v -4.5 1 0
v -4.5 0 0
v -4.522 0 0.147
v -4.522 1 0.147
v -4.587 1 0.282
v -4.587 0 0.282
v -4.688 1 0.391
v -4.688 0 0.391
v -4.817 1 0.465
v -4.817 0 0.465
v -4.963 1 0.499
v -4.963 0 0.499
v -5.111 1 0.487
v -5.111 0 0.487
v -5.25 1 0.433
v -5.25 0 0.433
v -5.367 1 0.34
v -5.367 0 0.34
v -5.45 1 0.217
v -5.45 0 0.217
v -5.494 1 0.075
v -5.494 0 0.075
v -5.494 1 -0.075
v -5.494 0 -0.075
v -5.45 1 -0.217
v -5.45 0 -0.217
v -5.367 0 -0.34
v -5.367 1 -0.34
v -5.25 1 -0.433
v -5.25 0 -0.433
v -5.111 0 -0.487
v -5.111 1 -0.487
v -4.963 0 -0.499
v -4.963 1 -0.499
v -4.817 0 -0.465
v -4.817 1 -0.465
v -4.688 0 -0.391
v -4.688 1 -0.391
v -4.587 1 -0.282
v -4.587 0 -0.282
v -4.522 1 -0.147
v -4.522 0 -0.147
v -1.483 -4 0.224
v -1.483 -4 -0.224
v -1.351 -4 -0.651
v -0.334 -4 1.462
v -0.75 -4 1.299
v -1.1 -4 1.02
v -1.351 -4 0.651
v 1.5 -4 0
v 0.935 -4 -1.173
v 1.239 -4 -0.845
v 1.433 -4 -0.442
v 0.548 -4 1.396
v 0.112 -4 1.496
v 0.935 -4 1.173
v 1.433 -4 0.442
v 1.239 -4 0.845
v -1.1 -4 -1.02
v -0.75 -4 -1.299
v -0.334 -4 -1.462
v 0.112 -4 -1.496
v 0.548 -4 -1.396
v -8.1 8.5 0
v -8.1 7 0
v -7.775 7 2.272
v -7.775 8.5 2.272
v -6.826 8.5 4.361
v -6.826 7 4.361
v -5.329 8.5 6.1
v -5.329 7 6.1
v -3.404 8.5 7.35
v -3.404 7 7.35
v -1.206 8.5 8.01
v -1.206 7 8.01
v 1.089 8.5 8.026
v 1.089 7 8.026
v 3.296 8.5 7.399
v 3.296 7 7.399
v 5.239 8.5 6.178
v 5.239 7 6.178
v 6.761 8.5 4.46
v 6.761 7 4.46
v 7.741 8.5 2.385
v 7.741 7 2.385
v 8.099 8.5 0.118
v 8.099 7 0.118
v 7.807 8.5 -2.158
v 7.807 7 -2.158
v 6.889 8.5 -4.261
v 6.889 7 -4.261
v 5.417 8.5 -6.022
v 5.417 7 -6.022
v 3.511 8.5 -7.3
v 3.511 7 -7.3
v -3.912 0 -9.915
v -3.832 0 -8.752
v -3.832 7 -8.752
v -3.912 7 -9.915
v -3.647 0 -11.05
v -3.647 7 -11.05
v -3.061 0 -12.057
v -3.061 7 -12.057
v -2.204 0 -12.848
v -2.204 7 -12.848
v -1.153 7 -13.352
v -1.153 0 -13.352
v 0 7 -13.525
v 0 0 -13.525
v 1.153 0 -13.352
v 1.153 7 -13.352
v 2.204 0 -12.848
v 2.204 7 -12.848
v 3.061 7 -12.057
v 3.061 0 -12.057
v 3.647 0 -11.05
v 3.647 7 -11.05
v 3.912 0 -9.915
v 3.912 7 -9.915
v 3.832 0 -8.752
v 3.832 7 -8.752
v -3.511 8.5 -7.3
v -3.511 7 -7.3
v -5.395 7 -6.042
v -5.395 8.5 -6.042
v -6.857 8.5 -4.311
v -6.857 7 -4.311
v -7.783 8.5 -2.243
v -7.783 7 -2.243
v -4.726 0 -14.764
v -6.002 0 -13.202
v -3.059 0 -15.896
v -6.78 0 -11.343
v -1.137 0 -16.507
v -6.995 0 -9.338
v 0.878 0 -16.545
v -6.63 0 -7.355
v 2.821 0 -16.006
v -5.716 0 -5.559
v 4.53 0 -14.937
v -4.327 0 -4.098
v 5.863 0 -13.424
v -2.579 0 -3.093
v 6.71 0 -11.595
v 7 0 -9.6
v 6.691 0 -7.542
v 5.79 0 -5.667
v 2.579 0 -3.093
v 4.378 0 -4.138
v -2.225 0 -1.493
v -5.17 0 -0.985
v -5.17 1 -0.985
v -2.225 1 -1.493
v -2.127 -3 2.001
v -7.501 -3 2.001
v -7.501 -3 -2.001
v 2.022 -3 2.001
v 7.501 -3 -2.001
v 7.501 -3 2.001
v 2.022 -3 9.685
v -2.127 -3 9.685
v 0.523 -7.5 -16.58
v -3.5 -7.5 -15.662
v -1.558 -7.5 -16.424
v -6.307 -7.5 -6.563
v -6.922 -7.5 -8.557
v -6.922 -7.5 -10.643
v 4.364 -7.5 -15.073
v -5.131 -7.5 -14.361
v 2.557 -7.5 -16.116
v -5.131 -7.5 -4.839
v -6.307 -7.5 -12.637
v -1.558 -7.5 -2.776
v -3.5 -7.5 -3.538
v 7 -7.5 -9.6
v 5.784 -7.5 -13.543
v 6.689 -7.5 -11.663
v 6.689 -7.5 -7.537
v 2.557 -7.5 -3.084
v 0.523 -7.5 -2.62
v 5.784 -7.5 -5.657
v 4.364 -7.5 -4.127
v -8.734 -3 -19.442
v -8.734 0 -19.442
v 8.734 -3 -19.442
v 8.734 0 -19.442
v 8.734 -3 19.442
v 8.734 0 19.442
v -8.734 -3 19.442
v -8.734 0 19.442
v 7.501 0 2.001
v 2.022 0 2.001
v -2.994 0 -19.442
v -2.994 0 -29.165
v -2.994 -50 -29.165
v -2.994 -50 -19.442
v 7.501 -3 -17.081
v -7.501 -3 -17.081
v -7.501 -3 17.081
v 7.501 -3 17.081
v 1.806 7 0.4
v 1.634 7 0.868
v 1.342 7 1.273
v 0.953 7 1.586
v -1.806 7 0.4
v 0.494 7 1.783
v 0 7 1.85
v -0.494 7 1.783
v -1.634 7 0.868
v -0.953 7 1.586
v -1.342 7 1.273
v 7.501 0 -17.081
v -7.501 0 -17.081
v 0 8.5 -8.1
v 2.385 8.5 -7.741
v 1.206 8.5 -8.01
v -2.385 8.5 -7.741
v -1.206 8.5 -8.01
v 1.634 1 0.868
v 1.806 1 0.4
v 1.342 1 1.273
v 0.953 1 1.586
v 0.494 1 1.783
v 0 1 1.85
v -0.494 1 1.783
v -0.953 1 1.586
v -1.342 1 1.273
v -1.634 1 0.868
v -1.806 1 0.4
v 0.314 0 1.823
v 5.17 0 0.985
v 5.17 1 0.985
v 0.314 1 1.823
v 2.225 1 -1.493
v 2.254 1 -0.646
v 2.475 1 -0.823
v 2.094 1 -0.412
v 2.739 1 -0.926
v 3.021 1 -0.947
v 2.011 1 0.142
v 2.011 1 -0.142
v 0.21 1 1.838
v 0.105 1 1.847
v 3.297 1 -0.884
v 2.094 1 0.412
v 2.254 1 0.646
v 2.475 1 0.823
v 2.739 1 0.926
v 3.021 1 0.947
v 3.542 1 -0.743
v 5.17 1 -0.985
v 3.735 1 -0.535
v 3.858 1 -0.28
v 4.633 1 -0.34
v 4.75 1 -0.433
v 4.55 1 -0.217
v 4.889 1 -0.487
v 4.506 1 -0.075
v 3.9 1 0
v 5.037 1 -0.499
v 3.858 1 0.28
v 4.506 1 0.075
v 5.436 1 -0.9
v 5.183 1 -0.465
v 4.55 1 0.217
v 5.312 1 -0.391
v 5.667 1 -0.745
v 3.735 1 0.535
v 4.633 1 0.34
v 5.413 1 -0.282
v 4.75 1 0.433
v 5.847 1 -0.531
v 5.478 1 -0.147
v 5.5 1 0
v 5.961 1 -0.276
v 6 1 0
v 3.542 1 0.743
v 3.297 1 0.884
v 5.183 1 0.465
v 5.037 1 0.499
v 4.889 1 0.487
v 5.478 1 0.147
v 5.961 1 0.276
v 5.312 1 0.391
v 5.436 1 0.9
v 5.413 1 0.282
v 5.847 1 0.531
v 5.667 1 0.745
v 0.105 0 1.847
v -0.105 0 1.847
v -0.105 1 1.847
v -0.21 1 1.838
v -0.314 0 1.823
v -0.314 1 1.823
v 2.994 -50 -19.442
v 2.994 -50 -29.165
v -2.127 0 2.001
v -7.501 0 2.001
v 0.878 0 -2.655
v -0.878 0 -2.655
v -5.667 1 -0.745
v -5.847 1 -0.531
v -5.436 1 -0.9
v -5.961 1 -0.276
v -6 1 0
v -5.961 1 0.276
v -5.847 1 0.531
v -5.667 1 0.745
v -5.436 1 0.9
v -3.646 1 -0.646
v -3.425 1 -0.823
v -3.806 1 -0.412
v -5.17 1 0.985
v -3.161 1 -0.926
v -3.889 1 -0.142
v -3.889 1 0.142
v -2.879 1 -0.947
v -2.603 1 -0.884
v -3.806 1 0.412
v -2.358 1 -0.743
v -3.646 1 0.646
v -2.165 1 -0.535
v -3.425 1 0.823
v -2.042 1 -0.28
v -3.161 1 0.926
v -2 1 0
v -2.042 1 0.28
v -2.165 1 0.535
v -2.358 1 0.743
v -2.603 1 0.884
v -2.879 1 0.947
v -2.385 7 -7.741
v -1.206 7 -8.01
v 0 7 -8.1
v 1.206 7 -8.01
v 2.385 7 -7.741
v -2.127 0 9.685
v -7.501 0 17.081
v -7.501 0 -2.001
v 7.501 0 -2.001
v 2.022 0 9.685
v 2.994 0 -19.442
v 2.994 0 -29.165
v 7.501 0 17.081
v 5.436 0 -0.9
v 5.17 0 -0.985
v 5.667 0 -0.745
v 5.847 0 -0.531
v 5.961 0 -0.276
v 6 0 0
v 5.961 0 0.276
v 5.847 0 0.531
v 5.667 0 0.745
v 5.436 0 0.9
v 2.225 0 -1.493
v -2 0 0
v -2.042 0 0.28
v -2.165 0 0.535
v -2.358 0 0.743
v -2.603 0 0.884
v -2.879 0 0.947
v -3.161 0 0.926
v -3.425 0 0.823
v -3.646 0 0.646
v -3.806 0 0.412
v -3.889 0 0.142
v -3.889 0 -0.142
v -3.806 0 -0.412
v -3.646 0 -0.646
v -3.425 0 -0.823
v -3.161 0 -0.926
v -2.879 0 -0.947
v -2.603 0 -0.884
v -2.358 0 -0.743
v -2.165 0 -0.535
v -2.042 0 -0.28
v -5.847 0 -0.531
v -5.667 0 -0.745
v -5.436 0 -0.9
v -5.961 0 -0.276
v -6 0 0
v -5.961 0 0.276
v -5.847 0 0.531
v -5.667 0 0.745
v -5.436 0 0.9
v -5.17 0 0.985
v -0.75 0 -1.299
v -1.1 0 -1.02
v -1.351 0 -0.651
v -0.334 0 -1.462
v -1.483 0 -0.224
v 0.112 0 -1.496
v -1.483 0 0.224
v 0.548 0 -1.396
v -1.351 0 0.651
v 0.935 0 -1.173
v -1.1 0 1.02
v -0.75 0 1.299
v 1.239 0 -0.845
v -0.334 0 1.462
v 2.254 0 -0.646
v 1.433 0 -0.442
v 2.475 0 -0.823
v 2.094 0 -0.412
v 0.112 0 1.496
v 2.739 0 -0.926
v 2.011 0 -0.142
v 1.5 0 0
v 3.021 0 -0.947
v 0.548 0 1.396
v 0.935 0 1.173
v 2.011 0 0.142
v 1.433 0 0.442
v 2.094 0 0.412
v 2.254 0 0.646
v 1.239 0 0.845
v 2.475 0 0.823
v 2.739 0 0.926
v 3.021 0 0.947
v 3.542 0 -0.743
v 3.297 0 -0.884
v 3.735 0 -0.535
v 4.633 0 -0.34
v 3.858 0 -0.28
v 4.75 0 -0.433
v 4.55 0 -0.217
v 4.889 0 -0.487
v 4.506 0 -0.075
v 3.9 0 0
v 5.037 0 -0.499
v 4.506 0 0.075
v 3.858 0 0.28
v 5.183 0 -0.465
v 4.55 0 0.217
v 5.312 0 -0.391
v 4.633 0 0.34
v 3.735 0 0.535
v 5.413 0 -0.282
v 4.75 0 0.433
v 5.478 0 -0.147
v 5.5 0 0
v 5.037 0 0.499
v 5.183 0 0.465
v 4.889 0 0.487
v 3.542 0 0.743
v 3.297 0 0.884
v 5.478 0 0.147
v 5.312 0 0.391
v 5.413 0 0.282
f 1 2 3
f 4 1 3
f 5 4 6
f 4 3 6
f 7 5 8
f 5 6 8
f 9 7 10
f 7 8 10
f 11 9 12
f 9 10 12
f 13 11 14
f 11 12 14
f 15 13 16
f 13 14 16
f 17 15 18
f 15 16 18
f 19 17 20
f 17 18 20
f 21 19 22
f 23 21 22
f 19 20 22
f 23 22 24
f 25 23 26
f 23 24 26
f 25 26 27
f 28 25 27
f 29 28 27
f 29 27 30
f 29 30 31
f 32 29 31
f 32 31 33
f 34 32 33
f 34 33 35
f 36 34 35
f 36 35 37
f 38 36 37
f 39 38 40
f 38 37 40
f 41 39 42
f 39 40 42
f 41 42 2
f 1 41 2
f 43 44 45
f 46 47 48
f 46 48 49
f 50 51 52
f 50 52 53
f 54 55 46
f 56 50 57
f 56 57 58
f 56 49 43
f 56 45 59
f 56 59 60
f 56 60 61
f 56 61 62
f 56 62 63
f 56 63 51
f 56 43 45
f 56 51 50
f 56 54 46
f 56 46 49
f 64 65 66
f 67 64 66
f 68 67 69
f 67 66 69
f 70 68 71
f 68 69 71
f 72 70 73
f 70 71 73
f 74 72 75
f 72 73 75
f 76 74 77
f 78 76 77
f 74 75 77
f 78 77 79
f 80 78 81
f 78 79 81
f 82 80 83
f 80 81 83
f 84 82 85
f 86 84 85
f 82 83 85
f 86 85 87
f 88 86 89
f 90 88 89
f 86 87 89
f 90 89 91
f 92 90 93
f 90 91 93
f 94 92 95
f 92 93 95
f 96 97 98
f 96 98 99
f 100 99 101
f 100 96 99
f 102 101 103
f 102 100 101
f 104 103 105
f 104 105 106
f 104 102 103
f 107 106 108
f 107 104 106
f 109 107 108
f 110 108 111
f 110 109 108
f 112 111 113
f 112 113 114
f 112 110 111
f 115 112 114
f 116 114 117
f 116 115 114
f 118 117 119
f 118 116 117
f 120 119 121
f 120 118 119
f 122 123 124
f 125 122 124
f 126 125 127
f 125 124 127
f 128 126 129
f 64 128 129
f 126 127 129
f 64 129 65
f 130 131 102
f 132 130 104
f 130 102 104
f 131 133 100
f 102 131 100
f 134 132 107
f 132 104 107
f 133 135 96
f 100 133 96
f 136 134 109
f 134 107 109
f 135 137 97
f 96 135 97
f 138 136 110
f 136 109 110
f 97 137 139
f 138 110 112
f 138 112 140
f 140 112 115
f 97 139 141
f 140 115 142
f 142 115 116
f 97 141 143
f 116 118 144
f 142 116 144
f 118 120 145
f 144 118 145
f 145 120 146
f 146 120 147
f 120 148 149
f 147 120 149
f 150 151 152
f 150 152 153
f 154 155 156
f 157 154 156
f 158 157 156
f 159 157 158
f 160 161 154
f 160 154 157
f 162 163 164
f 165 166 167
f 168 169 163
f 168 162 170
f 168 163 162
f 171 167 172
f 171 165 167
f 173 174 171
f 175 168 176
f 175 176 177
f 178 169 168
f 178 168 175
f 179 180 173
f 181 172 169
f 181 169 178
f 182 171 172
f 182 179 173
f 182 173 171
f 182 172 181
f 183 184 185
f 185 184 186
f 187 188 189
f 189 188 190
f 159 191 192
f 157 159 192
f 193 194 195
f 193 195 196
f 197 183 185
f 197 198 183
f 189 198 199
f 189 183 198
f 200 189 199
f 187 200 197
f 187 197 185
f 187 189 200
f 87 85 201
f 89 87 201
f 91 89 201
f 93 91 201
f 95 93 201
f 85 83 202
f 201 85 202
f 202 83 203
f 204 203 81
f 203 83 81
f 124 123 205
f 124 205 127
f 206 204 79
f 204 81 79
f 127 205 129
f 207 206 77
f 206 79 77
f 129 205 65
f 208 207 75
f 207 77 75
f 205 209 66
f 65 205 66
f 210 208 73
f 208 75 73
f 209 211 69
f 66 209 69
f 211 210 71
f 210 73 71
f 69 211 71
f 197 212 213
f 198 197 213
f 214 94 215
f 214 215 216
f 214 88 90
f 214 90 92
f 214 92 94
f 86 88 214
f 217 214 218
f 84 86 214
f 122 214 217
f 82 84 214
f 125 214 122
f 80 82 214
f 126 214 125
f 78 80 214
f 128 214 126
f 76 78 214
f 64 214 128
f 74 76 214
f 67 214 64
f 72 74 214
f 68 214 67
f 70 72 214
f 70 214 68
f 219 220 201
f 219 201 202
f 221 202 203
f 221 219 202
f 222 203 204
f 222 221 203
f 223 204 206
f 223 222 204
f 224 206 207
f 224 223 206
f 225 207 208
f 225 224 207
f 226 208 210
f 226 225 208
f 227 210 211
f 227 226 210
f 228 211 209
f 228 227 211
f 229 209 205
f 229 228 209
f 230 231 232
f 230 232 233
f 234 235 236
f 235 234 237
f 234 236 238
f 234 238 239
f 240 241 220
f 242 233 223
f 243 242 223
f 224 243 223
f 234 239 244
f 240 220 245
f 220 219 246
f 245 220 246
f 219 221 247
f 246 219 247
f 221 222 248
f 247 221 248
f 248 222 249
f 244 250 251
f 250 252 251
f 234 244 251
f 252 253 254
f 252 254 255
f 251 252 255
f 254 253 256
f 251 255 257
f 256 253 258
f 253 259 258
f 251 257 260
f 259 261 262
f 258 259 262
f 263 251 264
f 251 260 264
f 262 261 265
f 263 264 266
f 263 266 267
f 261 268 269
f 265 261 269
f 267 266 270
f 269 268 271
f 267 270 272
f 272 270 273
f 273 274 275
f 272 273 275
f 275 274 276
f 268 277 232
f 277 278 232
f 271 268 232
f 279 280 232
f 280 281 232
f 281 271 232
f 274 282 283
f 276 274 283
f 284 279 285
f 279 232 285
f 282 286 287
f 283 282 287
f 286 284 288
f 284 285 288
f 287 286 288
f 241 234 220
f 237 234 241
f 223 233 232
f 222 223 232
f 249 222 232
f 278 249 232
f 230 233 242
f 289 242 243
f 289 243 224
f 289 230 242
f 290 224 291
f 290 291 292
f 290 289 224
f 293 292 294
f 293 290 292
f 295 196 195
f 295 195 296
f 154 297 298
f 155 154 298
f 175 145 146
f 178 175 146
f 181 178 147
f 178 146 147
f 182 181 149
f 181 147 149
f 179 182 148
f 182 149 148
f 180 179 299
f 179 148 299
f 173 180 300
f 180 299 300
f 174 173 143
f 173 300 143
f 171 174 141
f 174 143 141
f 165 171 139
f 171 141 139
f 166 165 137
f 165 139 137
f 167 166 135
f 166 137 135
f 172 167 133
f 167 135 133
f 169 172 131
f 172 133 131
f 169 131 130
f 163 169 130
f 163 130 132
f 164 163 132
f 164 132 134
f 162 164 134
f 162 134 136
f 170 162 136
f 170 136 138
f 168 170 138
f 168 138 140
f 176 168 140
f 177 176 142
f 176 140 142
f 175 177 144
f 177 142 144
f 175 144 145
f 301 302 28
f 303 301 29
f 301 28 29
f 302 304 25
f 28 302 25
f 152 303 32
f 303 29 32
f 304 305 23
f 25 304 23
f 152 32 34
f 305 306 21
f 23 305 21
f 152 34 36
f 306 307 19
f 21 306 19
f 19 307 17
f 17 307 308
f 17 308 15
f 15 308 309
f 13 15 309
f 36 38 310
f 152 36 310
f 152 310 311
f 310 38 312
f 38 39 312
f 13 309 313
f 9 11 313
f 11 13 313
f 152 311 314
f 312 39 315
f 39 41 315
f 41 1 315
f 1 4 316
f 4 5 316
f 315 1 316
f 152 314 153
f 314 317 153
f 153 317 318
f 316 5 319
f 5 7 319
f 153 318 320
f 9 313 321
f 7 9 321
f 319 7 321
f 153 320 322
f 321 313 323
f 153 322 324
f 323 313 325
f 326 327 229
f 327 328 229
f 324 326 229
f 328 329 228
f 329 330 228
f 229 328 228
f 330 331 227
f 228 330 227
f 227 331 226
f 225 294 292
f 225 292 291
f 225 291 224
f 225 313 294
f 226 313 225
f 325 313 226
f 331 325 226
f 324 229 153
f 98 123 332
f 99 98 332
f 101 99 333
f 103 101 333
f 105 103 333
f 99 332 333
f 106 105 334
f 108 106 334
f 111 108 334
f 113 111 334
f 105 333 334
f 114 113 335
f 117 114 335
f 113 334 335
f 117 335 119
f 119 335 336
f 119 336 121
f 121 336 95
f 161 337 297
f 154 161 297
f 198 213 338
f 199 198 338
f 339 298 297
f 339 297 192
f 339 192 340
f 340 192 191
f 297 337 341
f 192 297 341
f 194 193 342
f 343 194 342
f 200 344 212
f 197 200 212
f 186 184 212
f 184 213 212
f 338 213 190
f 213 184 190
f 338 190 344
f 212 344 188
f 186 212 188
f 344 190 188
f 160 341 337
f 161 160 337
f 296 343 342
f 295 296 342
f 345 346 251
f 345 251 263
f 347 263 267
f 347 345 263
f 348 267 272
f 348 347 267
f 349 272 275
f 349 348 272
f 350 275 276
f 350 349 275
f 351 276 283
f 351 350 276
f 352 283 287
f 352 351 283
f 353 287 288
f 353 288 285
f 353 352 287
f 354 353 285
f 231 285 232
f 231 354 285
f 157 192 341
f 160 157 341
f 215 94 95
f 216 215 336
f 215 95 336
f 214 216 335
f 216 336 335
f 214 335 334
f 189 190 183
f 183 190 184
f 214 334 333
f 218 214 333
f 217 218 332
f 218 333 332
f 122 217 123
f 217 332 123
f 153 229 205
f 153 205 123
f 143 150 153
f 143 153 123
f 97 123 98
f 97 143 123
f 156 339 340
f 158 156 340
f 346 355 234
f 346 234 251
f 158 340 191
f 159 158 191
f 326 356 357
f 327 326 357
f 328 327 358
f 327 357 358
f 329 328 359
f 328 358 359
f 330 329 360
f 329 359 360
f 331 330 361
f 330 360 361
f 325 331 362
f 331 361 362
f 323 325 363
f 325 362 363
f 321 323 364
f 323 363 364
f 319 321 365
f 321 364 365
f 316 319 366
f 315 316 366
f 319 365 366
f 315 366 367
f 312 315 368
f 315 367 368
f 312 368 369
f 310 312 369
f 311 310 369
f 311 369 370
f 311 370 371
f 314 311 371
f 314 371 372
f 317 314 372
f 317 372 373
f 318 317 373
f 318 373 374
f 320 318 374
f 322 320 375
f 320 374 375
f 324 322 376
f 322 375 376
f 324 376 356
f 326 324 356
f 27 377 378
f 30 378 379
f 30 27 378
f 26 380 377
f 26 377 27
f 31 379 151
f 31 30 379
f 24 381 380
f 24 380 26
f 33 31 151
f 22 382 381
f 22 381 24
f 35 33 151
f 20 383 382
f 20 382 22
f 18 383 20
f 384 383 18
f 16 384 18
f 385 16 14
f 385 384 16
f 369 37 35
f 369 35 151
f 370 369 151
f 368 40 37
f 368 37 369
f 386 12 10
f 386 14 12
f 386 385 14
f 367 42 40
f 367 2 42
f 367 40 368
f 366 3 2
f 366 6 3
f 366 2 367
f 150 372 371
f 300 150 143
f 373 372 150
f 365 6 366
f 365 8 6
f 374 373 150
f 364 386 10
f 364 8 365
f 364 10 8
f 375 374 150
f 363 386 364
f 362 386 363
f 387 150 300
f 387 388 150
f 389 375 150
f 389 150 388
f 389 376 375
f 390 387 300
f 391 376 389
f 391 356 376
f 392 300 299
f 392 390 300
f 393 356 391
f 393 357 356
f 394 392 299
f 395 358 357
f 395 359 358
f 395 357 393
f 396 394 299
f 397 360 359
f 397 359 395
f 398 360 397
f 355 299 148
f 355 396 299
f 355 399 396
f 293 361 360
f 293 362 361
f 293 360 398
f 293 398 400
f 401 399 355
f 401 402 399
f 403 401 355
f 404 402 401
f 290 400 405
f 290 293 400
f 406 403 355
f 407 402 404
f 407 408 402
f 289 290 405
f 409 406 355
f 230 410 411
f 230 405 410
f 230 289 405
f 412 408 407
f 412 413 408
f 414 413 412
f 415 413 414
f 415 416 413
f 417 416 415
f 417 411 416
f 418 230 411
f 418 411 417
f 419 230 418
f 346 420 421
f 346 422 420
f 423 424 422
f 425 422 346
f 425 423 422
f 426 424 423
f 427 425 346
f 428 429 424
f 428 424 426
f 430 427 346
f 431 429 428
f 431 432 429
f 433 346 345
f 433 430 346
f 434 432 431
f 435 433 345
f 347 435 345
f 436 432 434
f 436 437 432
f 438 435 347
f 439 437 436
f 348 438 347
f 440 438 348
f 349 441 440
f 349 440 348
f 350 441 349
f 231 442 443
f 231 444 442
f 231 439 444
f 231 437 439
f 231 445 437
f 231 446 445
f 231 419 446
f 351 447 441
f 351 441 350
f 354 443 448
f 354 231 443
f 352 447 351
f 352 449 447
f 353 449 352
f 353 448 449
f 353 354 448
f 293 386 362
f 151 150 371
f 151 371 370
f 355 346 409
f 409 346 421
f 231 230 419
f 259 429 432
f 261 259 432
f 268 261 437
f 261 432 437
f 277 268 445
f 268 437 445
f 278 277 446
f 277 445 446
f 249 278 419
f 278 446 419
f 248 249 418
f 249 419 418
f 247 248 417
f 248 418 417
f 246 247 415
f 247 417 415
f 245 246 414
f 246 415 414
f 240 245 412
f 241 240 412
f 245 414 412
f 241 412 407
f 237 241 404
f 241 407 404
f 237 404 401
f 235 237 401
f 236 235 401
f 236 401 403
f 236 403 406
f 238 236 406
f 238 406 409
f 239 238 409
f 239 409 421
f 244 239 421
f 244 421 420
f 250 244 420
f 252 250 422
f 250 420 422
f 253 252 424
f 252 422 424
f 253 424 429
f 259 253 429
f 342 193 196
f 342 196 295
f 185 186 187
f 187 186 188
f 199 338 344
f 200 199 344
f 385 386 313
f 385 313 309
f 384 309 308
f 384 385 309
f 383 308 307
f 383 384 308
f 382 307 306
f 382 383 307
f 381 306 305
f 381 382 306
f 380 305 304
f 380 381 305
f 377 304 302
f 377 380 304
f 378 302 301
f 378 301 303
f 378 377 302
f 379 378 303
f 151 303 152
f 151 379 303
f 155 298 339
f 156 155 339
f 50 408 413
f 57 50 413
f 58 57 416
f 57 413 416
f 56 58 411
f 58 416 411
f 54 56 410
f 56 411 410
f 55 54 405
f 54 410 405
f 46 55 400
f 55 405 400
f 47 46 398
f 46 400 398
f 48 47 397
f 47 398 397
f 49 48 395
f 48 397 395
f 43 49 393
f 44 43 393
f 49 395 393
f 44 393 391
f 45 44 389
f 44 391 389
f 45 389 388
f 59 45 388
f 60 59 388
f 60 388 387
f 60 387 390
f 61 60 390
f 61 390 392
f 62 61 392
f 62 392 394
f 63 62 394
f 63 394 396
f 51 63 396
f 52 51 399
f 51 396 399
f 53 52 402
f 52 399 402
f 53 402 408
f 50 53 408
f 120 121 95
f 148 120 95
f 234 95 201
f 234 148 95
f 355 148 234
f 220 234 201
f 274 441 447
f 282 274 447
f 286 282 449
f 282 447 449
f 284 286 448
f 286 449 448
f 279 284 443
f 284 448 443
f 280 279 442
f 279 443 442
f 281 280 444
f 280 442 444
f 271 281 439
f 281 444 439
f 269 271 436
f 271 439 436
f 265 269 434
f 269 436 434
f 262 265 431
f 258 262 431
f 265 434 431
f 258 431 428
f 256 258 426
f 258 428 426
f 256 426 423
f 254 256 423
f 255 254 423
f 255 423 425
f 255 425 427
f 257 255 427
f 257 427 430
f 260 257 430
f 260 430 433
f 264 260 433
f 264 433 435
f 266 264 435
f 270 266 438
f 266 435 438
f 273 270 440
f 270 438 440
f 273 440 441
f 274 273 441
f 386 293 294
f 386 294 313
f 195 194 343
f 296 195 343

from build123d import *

# Parameters (mm, degrees)
F0_R      = 7
F2_DEPTH  = 7.5
F0_R_2    = 0.5
F0_R_3    = 0.95
F0_R_4    = 1.5
F3_DEPTH  = 1
F4_DEPTH  = 7
F6_DEPTH  = 1.5
F7_DEPTH  = 4
F9_DEPTH  = 3
F10_DEPTH = 3
F8_W      = 5.988852
F8_H      = 9.722866
F11_DEPTH = 50


with BuildPart() as f2:
    # F0 (on Front) → F2 (new body)
    with BuildSketch(Plane.XZ):
        with Locations((0, -9.6)):
            Circle(F0_R)
    extrude(amount=F2_DEPTH)



with BuildPart() as f3:
    # F0 (on Front) → F3 (new body)
    with BuildSketch(Plane.XZ):
        with BuildLine():
            ThreePointArc((-5.17, 0.985444), (-6, 0), (-5.17, -0.985444))
            Line((-5.17, -0.985444), (-0.3145, -1.823072))
            ThreePointArc((-0.3145, -1.823072), (0, -1.85), (0.3145, -1.823072))
            Line((0.3145, -1.823072), (5.17, -0.985444))
            ThreePointArc((5.17, -0.985444), (6, 0), (5.17, 0.985444))
            Line((5.17, 0.985444), (0.3145, 1.823072))
            ThreePointArc((0.3145, 1.823072), (0, 1.85), (-0.3145, 1.823072))
            Line((-0.3145, 1.823072), (-5.17, 0.985444))
        make_face()
        with Locations((-5, 0)):
            Circle(F0_R_2, mode=Mode.SUBTRACT)
        with Locations((-2.95, 0)):
            Circle(F0_R_3, mode=Mode.SUBTRACT)
        Circle(F0_R_4, mode=Mode.SUBTRACT)
        with Locations((2.95, 0)):
            Circle(F0_R_3, mode=Mode.SUBTRACT)
        with Locations((5, 0)):
            Circle(F0_R_2, mode=Mode.SUBTRACT)
        Circle(F0_R_4)
    extrude(amount=-F3_DEPTH)


with BuildPart() as f2_1:
    add(f2.part)

    add(f3.part)  # F4 merges F3
    # F1 (on Front) → F4 (join)
    with BuildSketch(Plane.XZ):
        with BuildLine():
            ThreePointArc((1.806268, 0.39987), (0, 1.85), (-1.806268, 0.39987))
            Line((-1.806268, 0.39987), (-3.832217, -8.751628))
            ThreePointArc((-3.832217, -8.751628), (0, -13.525), (3.832217, -8.751628))
            Line((3.832217, -8.751628), (1.806268, 0.39987))
        make_face()
    extrude(amount=-F4_DEPTH)

    # F5 (on face) → F6 (join)
    with BuildSketch(Plane(origin=(0, 7, 0), x_dir=(-1, 0, 0), z_dir=(0, 1, 0))):
        with BuildLine():
            Line((-1.806268, 0.39987), (-3.510774, -7.299621))
            ThreePointArc((-3.510774, -7.299621), (-1.800426, -7.897371), (0, -8.1))
            ThreePointArc((0, -8.1), (1.800426, -7.897371), (3.510774, -7.299621))
            Line((3.510774, -7.299621), (1.806268, 0.39987))
            ThreePointArc((1.806268, 0.39987), (0, 1.85), (-1.806268, 0.39987))
        make_face()
        with BuildLine():
            ThreePointArc((3.510774, -7.299621), (6.857378, -4.311191), (8.1, 0))
            ThreePointArc((8.1, 0), (-4.311191, 6.857378), (-3.510774, -7.299621))
            Line((-3.510774, -7.299621), (-1.806268, 0.39987))
            ThreePointArc((-1.806268, 0.39987), (0, 1.85), (1.806268, 0.39987))
            Line((1.806268, 0.39987), (3.510774, -7.299621))
        make_face()
    extrude(amount=F6_DEPTH)

    # F0 (on Front) → F7 (join)
    with BuildSketch(Plane.XZ):
        Circle(F0_R_4)
    extrude(amount=F7_DEPTH)


with BuildPart() as f9:
    # F8 (on Front) → F9 (new body)
    with BuildSketch(Plane.XZ):
        Polygon((8.733529, -19.442188), (8.733529, 19.442188), (-8.733529, 19.442188), (-8.733529, -19.442188), (-2.994426, -19.442188), (2.994426, -19.442188), align=None)
        Polygon((7.500878, 2.001245), (7.500878, -2.001245), (7.500878, -17.080791), (-7.500878, -17.080791), (-7.500878, -2.001245), (-7.500878, 2.001245), (-7.500878, 17.080791), (7.500878, 17.080791), align=None, mode=Mode.SUBTRACT)
    extrude(amount=F9_DEPTH)


with BuildPart() as f10:
    # F8 (on Front) → F10 (new body)
    with BuildSketch(Plane.XZ):
        Polygon((-7.500878, -2.001245), (7.500878, -2.001245), (7.500878, 2.001245), (2.022431, 2.001245), (2.022431, 9.684889), (-2.127044, 9.684889), (-2.127044, 2.001245), (-7.500878, 2.001245), align=None)
    extrude(amount=F10_DEPTH)


with BuildPart() as f11:
    # F8 (on Front) → F11 (new body)
    with BuildSketch(Plane.XZ):
        with Locations((0, -24.303621)):
            Rectangle(F8_W, F8_H)
    extrude(amount=F11_DEPTH)


solid = Compound([f2_1.part, f9.part, f10.part, f11.part])
